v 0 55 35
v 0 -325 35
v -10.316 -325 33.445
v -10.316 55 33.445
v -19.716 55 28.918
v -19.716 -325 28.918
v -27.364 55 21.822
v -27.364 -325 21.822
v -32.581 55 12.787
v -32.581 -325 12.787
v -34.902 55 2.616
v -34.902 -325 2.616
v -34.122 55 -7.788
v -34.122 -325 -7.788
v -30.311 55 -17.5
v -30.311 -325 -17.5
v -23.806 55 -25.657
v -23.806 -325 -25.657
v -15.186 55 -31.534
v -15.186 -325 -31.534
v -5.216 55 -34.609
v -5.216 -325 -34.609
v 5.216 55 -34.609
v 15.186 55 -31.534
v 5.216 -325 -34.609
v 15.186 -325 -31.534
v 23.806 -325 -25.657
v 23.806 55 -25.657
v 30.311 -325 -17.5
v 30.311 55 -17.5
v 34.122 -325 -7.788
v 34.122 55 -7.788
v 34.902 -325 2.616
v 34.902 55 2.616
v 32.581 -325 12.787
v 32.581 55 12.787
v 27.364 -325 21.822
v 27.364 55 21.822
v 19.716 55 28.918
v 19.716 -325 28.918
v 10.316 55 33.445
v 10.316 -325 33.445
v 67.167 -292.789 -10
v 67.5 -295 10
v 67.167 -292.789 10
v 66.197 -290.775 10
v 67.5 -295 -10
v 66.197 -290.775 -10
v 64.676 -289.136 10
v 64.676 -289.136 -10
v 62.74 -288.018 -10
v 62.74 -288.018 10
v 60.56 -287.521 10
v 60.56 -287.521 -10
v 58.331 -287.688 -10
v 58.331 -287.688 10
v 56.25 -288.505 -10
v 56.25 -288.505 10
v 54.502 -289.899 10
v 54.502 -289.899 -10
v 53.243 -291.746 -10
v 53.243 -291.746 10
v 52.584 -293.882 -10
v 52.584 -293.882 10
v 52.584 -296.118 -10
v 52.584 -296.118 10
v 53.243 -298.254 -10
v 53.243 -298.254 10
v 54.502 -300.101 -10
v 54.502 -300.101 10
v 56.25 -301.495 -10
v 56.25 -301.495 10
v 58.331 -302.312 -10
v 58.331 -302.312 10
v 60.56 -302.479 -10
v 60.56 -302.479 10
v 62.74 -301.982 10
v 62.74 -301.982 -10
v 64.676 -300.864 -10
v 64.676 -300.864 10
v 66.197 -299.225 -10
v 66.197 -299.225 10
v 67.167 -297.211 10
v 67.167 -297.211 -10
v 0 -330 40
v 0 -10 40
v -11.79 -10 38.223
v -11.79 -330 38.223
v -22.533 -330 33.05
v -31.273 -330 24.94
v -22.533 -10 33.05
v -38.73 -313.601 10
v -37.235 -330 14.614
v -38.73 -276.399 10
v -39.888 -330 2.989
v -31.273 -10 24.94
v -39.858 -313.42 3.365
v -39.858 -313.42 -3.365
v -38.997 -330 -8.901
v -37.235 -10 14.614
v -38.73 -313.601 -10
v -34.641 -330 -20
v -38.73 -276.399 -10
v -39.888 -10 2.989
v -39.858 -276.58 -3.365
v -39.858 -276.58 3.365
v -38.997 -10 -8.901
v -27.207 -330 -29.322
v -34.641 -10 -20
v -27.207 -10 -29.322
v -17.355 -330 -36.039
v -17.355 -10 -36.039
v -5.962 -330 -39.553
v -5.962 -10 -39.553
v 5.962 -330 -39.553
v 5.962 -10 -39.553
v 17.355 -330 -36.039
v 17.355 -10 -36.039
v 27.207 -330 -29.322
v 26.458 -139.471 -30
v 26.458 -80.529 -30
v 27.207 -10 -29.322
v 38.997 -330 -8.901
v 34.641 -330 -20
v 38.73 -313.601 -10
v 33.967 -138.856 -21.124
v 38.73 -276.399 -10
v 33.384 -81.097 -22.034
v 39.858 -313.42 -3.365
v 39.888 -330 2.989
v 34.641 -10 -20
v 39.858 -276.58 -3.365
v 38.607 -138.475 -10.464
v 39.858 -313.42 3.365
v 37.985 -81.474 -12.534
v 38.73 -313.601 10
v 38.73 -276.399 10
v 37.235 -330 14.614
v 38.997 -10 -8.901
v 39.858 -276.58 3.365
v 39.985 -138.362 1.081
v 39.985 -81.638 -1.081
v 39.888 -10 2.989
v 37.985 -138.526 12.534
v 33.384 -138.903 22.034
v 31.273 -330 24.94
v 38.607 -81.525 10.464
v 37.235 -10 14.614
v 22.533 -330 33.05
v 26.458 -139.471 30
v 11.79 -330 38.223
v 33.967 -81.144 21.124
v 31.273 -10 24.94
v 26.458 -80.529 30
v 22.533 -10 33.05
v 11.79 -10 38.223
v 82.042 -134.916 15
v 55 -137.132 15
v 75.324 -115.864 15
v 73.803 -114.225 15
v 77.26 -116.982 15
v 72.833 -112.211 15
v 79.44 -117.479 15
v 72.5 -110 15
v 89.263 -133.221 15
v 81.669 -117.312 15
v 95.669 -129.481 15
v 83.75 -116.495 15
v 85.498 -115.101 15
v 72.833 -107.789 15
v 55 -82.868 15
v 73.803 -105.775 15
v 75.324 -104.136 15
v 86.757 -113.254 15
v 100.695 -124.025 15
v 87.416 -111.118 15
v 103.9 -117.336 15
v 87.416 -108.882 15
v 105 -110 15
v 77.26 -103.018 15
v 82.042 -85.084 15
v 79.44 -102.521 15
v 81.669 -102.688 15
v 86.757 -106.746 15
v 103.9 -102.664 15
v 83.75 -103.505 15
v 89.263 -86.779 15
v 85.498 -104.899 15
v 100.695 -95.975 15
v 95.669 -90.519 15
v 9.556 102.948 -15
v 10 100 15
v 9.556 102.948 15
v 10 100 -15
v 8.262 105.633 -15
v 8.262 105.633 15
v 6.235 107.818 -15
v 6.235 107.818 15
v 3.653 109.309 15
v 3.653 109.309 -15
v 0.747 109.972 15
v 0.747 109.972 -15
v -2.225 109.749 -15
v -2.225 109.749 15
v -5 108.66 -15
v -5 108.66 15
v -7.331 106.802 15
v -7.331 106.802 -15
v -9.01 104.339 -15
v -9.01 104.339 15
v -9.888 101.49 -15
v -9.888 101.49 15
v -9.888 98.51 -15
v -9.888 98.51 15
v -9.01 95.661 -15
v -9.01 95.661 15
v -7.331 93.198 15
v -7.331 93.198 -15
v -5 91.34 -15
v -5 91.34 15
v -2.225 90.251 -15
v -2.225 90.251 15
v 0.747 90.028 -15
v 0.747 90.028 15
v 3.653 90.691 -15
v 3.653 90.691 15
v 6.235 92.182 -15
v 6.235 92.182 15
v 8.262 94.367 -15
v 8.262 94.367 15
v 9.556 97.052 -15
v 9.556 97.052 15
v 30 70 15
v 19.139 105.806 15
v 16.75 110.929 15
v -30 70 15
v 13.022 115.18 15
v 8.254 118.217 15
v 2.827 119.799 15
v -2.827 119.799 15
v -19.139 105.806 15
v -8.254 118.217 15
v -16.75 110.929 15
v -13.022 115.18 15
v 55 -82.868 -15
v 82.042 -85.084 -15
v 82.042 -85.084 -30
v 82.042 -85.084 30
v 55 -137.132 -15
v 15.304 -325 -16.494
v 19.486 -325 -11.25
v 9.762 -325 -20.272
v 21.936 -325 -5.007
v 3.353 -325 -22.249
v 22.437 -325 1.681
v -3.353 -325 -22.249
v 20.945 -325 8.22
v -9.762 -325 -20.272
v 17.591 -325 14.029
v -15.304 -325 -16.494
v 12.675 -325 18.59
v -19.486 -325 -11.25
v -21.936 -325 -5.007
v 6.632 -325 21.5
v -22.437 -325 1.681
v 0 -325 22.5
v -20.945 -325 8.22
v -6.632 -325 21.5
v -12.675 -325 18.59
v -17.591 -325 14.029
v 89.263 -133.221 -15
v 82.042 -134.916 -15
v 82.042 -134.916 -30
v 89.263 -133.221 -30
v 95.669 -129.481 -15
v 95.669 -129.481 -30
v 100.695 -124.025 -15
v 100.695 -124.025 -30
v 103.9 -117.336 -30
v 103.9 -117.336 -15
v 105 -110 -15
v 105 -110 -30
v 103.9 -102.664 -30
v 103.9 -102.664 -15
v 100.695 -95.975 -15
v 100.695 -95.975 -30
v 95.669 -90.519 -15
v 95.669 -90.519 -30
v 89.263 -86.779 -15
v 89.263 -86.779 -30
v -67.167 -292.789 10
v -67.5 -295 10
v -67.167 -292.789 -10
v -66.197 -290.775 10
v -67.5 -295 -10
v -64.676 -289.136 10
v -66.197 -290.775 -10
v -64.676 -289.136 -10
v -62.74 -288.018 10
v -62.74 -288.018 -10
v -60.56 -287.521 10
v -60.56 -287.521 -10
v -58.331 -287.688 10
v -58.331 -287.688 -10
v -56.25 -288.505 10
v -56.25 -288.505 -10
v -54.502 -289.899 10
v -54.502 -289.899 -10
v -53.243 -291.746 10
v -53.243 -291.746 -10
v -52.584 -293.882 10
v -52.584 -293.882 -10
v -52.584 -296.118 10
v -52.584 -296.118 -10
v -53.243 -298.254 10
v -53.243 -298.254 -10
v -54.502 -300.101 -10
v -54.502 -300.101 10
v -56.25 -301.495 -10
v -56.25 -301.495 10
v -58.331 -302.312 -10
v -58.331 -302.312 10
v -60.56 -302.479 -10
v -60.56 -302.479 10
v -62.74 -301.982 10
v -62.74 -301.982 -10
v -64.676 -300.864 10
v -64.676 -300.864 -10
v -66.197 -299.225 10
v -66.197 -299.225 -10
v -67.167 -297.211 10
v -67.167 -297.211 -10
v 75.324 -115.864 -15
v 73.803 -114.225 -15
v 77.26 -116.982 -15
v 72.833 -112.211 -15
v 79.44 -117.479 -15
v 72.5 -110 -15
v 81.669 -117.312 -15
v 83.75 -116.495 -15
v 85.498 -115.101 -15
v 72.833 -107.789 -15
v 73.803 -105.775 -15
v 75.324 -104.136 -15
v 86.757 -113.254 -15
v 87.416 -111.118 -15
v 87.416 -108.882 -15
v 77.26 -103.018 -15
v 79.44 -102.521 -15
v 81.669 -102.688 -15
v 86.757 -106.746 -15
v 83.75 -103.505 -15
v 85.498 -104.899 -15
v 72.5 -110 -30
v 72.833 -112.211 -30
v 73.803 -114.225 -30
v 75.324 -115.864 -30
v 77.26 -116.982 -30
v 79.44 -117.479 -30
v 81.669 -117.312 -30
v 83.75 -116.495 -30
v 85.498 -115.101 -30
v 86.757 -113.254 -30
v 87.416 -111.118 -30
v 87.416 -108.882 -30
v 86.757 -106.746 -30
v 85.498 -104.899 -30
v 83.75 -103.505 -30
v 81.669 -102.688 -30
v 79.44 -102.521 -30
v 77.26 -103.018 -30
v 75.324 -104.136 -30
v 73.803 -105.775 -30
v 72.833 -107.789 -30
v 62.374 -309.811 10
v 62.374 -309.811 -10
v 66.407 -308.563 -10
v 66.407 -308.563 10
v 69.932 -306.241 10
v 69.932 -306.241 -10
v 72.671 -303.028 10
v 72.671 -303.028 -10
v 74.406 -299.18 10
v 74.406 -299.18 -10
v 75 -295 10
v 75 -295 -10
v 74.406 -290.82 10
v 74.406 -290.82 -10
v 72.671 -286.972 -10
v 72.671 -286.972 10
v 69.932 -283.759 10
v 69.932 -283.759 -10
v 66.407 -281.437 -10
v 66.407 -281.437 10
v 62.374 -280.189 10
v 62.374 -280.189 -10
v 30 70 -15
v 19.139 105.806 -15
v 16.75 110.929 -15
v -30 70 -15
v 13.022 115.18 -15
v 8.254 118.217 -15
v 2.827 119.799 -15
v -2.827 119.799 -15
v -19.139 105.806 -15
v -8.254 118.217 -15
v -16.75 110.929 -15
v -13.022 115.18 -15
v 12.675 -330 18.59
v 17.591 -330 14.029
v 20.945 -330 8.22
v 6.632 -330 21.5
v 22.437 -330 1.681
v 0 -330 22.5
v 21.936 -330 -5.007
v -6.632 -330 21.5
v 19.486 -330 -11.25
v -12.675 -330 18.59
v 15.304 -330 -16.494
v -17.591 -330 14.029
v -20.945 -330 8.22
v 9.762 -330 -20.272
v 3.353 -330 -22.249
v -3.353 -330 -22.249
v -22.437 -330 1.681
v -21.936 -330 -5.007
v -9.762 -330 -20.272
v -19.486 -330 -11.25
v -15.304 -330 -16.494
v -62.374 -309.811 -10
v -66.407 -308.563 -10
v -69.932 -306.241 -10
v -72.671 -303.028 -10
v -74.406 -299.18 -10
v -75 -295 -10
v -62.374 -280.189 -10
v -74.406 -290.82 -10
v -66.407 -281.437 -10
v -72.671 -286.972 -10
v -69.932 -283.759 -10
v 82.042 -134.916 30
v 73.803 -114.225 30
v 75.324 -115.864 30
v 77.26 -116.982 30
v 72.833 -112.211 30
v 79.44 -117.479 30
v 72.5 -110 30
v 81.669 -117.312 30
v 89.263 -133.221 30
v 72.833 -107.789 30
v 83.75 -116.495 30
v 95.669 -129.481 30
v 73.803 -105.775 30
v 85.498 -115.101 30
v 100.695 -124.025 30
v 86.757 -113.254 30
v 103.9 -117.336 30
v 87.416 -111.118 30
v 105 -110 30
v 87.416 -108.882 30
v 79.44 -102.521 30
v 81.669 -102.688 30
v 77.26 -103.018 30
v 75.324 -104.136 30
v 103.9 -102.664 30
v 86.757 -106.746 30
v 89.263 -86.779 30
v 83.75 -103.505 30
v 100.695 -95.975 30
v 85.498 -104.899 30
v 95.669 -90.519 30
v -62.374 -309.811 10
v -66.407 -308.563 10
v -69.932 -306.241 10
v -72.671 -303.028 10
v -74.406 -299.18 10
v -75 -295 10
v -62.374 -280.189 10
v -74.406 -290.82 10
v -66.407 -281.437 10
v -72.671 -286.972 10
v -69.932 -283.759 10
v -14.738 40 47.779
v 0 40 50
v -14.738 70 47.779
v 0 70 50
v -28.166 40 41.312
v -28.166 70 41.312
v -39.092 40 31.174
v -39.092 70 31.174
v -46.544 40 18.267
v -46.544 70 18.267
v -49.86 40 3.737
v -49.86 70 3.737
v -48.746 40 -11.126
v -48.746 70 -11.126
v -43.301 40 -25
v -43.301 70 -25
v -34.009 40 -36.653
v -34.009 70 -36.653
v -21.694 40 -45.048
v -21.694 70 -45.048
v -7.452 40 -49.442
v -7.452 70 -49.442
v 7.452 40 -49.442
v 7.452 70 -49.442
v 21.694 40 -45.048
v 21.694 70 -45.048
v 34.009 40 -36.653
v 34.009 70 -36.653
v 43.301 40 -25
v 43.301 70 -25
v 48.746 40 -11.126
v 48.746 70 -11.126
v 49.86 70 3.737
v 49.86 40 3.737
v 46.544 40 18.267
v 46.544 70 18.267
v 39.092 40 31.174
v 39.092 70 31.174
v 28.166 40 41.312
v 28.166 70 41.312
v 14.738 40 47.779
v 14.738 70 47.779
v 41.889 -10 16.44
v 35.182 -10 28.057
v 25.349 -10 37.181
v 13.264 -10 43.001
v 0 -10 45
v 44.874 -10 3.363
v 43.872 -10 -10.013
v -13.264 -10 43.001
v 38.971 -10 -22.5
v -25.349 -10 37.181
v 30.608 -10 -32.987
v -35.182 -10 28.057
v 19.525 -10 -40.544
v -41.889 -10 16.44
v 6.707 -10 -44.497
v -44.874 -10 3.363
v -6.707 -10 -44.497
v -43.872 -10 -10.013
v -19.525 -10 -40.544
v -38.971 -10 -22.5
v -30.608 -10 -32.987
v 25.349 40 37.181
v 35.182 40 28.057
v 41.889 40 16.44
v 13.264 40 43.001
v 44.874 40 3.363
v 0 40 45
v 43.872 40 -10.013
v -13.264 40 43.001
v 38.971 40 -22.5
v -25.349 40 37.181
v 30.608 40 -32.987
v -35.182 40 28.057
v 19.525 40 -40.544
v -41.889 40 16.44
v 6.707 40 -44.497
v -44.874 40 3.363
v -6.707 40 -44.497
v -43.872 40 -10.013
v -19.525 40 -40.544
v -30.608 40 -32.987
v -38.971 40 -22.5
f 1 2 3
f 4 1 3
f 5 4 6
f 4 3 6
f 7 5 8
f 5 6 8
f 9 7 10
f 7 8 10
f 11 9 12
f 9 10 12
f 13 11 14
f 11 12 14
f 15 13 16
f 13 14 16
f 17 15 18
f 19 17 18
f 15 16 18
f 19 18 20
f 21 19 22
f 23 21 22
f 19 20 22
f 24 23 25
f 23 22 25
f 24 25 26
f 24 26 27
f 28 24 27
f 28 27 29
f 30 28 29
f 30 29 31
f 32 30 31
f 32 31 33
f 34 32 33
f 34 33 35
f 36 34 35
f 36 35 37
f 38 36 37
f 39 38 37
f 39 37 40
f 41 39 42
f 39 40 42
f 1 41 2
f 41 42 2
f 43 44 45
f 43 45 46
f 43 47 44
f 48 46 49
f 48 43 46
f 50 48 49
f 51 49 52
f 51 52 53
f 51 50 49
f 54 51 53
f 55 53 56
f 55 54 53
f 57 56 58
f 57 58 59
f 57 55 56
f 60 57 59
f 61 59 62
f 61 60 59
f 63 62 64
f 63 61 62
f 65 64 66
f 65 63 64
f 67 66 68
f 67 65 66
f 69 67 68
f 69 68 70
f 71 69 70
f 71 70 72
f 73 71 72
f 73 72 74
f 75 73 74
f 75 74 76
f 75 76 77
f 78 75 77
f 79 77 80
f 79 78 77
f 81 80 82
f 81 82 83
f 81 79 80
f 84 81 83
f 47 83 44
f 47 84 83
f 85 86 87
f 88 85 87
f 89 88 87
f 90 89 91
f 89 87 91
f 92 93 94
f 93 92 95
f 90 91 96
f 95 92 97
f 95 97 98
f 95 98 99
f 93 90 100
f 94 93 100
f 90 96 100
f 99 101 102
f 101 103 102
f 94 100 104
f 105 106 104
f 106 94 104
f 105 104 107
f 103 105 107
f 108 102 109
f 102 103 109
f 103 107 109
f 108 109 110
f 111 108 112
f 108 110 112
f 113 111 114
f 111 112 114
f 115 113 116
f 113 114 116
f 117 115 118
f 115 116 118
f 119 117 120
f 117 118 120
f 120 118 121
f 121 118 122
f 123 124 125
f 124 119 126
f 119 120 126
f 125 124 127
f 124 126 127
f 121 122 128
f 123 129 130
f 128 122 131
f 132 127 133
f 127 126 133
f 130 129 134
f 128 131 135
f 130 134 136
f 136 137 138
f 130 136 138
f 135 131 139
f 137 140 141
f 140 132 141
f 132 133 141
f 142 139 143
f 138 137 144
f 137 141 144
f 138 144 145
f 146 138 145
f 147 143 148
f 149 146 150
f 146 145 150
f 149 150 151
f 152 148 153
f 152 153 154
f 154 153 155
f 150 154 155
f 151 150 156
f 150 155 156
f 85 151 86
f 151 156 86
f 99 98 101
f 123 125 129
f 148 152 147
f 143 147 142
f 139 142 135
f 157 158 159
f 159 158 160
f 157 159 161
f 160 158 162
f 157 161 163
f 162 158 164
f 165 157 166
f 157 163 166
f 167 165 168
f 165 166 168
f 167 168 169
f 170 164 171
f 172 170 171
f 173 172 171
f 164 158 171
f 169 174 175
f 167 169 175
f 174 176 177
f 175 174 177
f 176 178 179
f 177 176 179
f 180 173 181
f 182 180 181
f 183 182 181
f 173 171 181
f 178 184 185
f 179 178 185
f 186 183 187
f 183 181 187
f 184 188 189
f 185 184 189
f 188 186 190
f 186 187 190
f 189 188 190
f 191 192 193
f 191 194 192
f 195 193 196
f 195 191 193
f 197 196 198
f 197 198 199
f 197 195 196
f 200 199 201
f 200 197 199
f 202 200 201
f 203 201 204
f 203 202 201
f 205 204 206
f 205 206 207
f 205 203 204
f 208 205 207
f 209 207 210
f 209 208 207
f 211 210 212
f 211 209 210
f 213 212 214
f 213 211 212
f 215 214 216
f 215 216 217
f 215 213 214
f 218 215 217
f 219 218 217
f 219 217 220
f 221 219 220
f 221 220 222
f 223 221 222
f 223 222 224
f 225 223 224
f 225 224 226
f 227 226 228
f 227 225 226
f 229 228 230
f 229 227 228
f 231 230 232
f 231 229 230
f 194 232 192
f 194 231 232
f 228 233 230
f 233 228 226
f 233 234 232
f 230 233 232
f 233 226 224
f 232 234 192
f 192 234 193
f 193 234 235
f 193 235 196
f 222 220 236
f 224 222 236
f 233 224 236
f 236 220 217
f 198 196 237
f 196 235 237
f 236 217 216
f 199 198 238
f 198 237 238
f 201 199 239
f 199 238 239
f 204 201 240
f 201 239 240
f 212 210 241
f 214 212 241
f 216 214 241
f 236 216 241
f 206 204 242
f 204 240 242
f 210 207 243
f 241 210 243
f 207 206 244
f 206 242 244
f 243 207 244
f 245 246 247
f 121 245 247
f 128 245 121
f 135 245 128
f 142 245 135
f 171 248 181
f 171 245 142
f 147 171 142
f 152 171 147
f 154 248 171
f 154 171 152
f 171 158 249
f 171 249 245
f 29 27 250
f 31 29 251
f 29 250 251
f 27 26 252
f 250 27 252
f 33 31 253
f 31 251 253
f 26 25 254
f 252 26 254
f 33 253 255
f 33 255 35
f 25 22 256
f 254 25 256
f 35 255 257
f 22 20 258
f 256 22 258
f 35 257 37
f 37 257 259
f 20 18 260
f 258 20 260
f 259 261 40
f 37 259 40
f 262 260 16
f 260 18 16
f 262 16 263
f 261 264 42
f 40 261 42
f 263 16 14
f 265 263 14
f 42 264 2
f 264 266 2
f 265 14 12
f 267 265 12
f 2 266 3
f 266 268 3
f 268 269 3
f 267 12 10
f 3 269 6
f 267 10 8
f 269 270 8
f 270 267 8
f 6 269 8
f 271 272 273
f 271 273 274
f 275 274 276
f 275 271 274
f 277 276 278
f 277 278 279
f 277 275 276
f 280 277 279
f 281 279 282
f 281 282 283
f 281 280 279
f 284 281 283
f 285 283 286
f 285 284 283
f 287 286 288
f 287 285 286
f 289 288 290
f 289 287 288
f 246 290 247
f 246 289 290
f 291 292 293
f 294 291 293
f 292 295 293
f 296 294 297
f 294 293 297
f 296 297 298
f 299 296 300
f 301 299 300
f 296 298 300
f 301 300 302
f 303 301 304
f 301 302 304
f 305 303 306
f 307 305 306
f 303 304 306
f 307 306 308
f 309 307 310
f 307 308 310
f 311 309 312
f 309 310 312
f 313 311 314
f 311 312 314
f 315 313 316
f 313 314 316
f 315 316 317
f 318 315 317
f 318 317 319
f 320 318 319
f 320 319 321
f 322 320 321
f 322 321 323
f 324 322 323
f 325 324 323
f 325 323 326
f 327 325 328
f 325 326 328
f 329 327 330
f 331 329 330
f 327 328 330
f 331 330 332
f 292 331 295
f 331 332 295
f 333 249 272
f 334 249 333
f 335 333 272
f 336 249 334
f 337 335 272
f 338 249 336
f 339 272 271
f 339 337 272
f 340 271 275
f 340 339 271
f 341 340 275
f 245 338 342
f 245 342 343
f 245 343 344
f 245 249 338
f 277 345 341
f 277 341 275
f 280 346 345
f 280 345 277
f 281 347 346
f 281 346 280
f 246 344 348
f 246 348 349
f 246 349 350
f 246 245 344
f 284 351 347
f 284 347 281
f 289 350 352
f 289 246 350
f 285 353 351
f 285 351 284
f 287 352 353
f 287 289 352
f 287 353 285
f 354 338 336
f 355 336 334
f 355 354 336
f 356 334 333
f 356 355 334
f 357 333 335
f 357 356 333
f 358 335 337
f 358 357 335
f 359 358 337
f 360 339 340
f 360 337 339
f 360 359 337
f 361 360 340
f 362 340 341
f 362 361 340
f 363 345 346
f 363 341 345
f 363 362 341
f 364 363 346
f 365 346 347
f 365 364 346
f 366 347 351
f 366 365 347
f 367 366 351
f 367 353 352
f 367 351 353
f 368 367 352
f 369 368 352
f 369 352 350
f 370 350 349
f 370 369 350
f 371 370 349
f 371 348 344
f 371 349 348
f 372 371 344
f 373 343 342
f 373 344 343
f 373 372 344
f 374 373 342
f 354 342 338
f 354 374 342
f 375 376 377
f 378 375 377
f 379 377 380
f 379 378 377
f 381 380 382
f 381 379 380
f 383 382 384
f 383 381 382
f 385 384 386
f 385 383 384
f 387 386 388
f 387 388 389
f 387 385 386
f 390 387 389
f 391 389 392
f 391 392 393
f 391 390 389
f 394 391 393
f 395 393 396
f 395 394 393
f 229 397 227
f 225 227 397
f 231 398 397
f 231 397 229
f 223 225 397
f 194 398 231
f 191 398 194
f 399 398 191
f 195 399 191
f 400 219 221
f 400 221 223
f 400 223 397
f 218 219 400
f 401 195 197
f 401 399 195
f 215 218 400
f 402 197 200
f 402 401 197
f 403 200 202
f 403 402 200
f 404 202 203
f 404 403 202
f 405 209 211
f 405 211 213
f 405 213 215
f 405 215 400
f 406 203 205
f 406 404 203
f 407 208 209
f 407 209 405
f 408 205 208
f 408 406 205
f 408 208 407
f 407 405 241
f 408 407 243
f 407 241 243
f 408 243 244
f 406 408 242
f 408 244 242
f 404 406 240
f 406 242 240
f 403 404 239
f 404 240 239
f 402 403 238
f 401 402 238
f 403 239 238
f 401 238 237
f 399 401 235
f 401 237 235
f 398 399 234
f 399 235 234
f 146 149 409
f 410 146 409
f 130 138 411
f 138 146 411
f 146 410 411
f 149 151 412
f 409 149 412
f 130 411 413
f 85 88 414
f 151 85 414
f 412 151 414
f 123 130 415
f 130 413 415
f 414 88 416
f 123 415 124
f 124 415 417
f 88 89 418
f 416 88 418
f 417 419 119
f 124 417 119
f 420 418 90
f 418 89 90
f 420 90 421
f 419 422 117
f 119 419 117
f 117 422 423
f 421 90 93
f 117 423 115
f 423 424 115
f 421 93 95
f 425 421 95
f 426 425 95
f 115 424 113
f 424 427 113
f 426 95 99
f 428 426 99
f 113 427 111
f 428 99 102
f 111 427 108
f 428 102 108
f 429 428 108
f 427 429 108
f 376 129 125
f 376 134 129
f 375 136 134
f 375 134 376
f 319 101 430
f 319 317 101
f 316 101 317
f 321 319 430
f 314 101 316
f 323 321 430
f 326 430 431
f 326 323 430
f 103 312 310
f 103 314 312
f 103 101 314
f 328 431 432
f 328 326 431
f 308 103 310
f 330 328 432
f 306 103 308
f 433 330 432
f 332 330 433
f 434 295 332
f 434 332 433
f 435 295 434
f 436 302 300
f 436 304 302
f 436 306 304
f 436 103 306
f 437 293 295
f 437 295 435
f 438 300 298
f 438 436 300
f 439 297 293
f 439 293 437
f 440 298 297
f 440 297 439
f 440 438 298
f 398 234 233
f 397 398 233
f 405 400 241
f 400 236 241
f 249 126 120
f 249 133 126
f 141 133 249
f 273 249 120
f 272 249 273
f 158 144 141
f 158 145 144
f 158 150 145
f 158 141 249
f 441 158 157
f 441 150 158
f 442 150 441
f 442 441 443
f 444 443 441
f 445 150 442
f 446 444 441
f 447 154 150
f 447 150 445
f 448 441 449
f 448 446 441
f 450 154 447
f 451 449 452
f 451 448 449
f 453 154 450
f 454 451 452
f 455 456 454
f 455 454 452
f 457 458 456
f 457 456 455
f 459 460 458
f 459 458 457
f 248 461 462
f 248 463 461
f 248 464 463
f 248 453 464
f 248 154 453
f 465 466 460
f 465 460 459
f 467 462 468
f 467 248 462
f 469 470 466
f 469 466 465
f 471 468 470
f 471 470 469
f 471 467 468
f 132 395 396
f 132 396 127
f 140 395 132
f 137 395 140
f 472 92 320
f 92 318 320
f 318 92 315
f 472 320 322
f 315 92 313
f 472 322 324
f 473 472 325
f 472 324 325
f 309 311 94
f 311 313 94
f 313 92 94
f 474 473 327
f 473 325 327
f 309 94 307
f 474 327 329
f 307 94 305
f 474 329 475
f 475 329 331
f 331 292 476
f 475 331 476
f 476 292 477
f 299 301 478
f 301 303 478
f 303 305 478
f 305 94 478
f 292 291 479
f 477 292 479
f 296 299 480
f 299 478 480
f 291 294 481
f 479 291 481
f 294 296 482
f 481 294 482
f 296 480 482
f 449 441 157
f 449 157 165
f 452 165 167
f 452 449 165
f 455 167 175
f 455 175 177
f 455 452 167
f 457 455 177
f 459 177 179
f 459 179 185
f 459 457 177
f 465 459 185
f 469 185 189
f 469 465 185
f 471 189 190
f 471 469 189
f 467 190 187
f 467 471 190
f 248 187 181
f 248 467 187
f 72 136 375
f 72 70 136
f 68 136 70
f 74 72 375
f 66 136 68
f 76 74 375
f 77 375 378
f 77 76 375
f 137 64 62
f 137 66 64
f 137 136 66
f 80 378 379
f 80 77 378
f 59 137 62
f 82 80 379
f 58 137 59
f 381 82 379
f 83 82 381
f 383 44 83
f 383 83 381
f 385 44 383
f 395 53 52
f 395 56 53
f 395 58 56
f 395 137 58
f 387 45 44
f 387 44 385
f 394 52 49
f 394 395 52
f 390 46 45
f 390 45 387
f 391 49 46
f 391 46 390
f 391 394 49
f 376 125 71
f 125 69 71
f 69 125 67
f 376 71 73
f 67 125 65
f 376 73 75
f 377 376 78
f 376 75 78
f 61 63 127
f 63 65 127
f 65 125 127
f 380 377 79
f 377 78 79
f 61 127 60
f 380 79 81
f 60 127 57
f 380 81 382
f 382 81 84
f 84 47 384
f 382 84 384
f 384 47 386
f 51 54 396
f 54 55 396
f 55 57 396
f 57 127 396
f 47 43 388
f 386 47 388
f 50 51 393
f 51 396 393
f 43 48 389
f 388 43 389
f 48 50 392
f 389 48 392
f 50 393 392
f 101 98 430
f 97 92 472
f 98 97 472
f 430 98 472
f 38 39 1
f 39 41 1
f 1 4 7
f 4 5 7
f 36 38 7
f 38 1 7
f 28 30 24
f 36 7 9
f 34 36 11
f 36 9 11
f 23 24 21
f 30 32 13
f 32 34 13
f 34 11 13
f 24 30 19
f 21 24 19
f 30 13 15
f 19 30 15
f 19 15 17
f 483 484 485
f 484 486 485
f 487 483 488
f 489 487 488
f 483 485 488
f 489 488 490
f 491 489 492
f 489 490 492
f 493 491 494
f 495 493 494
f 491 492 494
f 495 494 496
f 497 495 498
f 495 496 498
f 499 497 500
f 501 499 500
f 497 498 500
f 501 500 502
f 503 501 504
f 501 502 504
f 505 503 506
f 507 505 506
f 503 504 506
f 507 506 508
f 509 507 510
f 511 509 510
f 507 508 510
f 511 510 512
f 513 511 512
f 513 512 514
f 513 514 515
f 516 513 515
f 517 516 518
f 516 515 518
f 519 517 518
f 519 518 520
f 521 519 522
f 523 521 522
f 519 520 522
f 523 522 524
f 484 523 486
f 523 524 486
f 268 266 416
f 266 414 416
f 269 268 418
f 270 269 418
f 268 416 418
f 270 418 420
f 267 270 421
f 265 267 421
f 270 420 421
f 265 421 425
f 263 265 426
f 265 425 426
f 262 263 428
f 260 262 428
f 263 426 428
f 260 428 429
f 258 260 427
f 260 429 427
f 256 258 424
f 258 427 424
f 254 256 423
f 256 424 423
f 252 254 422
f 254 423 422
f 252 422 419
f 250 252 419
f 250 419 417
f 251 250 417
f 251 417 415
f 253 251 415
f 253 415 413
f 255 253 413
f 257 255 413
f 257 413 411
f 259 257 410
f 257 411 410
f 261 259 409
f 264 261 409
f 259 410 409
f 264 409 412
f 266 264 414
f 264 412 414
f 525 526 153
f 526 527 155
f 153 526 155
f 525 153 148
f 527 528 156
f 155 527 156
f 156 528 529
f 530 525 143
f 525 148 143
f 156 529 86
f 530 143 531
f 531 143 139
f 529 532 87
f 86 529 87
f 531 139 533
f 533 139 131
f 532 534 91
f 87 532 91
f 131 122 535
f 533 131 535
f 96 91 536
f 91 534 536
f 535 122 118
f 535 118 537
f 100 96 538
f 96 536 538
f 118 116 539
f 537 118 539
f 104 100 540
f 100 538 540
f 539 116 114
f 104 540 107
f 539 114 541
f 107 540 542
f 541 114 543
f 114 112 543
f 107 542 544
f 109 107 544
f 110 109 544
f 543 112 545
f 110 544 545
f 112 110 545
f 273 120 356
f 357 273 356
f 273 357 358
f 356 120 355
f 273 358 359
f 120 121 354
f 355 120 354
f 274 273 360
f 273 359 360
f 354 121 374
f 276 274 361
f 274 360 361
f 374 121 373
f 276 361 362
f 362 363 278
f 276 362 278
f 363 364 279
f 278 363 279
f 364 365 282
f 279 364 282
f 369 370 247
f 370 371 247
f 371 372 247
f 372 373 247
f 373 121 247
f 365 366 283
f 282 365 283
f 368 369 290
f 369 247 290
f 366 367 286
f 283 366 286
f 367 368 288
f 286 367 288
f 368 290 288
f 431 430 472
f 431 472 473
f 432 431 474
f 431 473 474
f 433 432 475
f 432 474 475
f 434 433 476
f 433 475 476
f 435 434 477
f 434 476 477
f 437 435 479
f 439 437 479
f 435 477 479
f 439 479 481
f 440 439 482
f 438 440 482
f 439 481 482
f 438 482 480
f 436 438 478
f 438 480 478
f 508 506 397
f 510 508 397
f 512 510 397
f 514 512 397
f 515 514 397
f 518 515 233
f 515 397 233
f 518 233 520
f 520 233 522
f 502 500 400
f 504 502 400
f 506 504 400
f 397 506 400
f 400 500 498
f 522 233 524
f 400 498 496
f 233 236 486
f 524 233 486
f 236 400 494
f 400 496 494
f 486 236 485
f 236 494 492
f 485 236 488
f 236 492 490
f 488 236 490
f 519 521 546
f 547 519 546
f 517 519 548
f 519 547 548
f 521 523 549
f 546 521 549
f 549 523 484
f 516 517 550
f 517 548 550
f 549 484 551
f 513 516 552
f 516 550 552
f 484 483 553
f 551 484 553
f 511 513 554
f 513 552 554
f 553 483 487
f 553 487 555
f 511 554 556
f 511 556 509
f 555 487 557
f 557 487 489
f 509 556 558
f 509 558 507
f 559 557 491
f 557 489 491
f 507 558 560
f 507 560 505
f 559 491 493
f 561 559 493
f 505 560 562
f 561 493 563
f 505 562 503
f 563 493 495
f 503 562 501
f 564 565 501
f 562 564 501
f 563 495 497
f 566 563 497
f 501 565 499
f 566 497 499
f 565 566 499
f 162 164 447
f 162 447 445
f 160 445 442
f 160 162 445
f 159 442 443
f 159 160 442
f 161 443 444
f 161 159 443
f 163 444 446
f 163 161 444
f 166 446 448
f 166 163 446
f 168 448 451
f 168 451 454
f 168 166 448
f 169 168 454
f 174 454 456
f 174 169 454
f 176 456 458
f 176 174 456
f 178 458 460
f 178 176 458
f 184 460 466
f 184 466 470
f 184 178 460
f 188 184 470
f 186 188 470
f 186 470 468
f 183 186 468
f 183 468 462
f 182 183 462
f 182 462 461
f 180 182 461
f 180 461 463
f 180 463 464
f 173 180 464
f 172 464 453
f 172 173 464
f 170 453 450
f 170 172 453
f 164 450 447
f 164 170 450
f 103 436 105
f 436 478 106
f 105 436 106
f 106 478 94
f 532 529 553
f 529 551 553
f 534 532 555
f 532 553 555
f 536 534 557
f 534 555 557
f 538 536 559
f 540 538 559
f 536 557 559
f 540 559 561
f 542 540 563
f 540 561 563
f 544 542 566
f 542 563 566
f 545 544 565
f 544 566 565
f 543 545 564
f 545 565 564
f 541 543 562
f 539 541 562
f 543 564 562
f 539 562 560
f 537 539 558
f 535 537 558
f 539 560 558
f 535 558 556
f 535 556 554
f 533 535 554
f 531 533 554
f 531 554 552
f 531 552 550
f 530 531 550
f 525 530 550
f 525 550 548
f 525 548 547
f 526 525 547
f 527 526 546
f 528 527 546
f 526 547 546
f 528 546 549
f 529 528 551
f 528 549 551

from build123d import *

# Parameters (mm, degrees)
SKETCH2_R           = 10
BOSS_EXTRUDE1_DEPTH = 15
SKETCH3_R           = 7.5
BOSS_EXTRUDE2_DEPTH = 10
SKETCH8_R           = 7.5
BOSS_EXTRUDE3_DEPTH = 30
SKETCH4_W           = 35
SKETCH4_H           = 315
SKETCH9_W           = 70
SKETCH9_H           = 80
CUT_EXTRUDE1_DEPTH  = 15


with BuildPart() as part:
    # Sketch1 → Base-Revolve (revolve)
    with BuildSketch(Plane.XY, mode=Mode.PRIVATE) as base_revolve_sk:
        Polygon((22.5, -330), (40, -330), (40, -10), (45, -10), (45, 40), (50, 40), (50, 70), (0, 70), (0, 55), (35, 55), (35, -325), (22.5, -325), align=None)
    revolve(base_revolve_sk.sketch.rotate(Axis((0, 100, 0), (0, -1, 0)), 90), axis=Axis((0, 100, 0), (0, -1, 0)))

    # Sketch2 → Boss-Extrude1 (add, symmetric)
    with BuildSketch(Plane.XY):
        with BuildLine():
            Line((19.138857956, 105.805524623), (30, 70))
            Line((30, 70), (-30, 70))
            Line((-30, 70), (-19.138857956, 105.805524623))
            ThreePointArc((-19.138857956, 105.805524623), (0, 120), (19.138857956, 105.805524623))
        make_face()
        with Locations((0, 100)):
            Circle(SKETCH2_R, mode=Mode.SUBTRACT)
    extrude(amount=BOSS_EXTRUDE1_DEPTH, both=True)

    # Sketch3 → Boss-Extrude2 (add, symmetric)
    with BuildSketch(Plane.XY):
        with BuildLine():
            Line((62.373967528, -280.189048708), (30, -275))
            Line((30, -275), (30, -315))
            Line((30, -315), (62.373967528, -309.810951292))
            ThreePointArc((62.373967528, -309.810951292), (75, -295), (62.373967528, -280.189048708))
        make_face()
        with Locations((60, -295)):
            Circle(SKETCH3_R, mode=Mode.SUBTRACT)
    boss_extrude2 = extrude(amount=BOSS_EXTRUDE2_DEPTH, both=True)

    # Mirror1: Boss-Extrude2 across plane
    add(boss_extrude2.mirror(Plane(origin=(0, 0, 0), x_dir=(0, 0, 1), z_dir=(1, 0, 0))))

    # Sketch8 → Boss-Extrude3 (add, symmetric)
    with BuildSketch(Plane.XY):
        with BuildLine():
            Line((82.041582998, -85.08350067), (20, -80))
            Line((20, -80), (20, -140))
            Line((20, -140), (82.041582998, -134.91649933))
            ThreePointArc((82.041582998, -134.91649933), (105, -110), (82.041582998, -85.08350067))
        make_face()
        with Locations(Location((80, -110, 0), (0, 0, 180))):
            Circle(SKETCH8_R, mode=Mode.SUBTRACT)
    extrude(amount=BOSS_EXTRUDE3_DEPTH, both=True)

    # Sketch4 → Cut-Revolve1 (revolve, cut)
    with BuildSketch(Plane.XY):
        with Locations((17.5, -167.5)):
            Rectangle(SKETCH4_W, SKETCH4_H)
    revolve(axis=Axis((0, 0, 0), (0, -1, 0)), mode=Mode.SUBTRACT)

    # Sketch9 → Cut-Extrude1 (cut, symmetric)
    with BuildSketch(Plane.XY):
        with Locations((90, -110)):
            Rectangle(SKETCH9_W, SKETCH9_H)
    extrude(amount=CUT_EXTRUDE1_DEPTH, both=True, mode=Mode.SUBTRACT)


solid = part.part
